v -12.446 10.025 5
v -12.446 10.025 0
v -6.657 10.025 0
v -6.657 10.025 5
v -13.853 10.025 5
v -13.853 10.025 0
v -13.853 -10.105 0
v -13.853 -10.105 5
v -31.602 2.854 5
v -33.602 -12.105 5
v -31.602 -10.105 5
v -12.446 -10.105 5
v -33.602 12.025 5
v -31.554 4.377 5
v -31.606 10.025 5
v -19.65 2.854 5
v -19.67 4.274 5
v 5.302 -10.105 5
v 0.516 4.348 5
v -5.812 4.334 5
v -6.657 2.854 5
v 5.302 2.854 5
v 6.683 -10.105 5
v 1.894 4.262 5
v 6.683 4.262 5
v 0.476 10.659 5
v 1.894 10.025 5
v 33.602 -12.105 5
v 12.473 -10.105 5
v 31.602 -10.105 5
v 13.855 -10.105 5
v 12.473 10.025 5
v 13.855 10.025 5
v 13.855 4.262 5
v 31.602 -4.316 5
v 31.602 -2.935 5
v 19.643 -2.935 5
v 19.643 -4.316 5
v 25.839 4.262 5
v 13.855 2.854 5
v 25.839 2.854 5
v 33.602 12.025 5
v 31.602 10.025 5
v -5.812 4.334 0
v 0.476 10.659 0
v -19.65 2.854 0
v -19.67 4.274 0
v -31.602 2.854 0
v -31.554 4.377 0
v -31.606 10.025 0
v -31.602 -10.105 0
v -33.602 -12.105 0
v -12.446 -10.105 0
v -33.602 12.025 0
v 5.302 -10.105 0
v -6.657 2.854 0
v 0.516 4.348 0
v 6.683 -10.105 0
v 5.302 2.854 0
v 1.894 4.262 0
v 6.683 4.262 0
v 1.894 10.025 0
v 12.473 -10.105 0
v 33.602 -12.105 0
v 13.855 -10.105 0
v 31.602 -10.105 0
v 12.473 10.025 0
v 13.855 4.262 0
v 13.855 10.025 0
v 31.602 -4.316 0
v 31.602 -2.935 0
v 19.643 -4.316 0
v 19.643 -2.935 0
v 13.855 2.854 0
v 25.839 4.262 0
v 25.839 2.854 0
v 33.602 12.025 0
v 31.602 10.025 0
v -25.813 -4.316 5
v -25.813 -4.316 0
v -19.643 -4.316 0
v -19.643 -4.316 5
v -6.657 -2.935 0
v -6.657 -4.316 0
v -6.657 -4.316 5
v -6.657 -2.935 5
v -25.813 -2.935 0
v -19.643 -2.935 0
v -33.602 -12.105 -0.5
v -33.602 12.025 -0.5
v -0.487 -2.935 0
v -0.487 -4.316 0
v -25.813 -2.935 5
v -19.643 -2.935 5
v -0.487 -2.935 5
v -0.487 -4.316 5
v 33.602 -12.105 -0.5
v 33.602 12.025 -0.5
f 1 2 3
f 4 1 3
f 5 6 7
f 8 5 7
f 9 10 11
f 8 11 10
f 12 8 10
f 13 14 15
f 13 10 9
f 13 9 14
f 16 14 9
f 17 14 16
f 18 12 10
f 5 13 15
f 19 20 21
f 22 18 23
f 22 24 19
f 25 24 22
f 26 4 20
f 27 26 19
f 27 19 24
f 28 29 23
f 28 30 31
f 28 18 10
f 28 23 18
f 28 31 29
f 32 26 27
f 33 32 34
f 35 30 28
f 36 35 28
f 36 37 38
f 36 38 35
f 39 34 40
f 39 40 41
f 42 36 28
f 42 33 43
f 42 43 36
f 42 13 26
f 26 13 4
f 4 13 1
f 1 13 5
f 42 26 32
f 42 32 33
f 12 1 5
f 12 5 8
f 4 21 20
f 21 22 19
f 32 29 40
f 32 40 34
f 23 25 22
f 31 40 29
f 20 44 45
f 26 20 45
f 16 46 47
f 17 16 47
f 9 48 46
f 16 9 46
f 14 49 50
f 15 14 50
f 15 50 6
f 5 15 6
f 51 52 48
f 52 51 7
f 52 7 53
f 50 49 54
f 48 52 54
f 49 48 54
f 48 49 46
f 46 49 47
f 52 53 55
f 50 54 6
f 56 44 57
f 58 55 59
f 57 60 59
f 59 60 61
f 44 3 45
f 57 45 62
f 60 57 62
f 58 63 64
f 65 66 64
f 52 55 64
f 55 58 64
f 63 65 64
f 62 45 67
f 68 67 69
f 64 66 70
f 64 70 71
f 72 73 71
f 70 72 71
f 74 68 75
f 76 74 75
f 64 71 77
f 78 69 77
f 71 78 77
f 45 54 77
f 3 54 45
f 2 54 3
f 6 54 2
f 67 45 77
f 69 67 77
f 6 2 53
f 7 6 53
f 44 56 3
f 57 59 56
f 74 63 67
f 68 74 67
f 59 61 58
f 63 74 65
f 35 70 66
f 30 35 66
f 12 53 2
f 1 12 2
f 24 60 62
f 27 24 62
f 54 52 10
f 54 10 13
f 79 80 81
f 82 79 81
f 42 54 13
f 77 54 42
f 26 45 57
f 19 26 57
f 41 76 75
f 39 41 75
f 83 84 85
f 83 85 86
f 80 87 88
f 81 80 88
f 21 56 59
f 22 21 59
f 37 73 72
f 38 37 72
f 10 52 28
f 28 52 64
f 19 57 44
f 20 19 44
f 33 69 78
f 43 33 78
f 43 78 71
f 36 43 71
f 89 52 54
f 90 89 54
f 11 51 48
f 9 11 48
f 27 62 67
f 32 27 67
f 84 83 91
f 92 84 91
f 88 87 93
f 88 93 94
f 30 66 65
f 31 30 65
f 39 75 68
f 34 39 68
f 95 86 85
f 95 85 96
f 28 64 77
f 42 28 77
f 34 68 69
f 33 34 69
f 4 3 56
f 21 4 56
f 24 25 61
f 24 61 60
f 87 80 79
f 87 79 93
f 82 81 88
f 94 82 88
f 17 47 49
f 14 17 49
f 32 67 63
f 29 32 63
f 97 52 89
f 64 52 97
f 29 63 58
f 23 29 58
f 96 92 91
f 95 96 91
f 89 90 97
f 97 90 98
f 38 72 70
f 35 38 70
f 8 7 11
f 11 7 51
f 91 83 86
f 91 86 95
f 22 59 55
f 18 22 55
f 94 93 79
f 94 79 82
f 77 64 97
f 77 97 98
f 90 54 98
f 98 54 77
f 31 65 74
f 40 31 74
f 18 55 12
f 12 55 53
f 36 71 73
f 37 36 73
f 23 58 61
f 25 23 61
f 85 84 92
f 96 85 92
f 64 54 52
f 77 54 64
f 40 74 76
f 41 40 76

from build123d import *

# Parameters (mm, degrees)
F0_W     = 67.203204
F0_H     = 24.12996
F1_DEPTH = 5
F0_W_2   = 6.169912
F0_H_2   = 1.38125
F0_W_3   = 6.170014
F2_DEPTH = 5
F3_W     = 67.203204
F3_H     = 24.12996
F4_DEPTH = 0.5


with BuildPart() as f1:
    # F0 (on Top) → F1 (new body)
    with BuildSketch(Plane.XY):
        with Locations((-1.3e-05, -0.040005)):
            Rectangle(F0_W, F0_H)
        Polygon((-31.554361, 4.377002), (-31.606227, 10.024975), (-13.852981, 10.024975), (-13.852981, -10.104985), (-31.601615, -10.104985), (-31.601615, 2.853666), (-19.650115, 2.853666), (-19.67042, 4.273602), align=None, mode=Mode.SUBTRACT)
        Polygon((5.301667, -10.104985), (-12.44557, -10.104985), (-12.44557, 10.024975), (-6.656907, 10.024975), (-6.656907, 2.853666), (5.301667, 2.853666), align=None, mode=Mode.SUBTRACT)
        Polygon((-5.811986, 4.334379), (0.476491, 10.659036), (0.51615, 4.347598), align=None, mode=Mode.SUBTRACT)
        Polygon((12.473357, 10.024975), (12.473357, -10.104985), (6.682916, -10.104985), (6.682916, 4.262474), (1.894254, 4.262474), (1.894254, 10.024975), align=None, mode=Mode.SUBTRACT)
        Polygon((25.839088, 4.262474), (13.854606, 4.262474), (13.854606, 10.024975), (31.601589, 10.024975), (31.601589, -2.935048), (19.643015, -2.935048), (19.643015, -4.316297), (31.601589, -4.316297), (31.601589, -10.104985), (13.854606, -10.104985), (13.854606, 2.853666), (25.839088, 2.853666), align=None, mode=Mode.SUBTRACT)
    extrude(amount=F1_DEPTH)


with BuildPart() as f2:
    # F0 (on Top) → F2 (new body)
    with BuildSketch(Plane.XY):
        with Locations((-3.571951, -3.625672)):
            Rectangle(F0_W_2, F0_H_2)
        with Locations((-22.72792, -3.625672)):
            Rectangle(F0_W_3, F0_H_2)
    extrude(amount=F2_DEPTH)


with BuildPart() as f4:
    # F3 (on face) → F4 (new body)
    with BuildSketch(Plane.XY):
        with Locations((-1.3e-05, -0.040005)):
            Rectangle(F3_W, F3_H)
    extrude(amount=-F4_DEPTH)


solid = Compound([f1.part, f2.part, f4.part])
